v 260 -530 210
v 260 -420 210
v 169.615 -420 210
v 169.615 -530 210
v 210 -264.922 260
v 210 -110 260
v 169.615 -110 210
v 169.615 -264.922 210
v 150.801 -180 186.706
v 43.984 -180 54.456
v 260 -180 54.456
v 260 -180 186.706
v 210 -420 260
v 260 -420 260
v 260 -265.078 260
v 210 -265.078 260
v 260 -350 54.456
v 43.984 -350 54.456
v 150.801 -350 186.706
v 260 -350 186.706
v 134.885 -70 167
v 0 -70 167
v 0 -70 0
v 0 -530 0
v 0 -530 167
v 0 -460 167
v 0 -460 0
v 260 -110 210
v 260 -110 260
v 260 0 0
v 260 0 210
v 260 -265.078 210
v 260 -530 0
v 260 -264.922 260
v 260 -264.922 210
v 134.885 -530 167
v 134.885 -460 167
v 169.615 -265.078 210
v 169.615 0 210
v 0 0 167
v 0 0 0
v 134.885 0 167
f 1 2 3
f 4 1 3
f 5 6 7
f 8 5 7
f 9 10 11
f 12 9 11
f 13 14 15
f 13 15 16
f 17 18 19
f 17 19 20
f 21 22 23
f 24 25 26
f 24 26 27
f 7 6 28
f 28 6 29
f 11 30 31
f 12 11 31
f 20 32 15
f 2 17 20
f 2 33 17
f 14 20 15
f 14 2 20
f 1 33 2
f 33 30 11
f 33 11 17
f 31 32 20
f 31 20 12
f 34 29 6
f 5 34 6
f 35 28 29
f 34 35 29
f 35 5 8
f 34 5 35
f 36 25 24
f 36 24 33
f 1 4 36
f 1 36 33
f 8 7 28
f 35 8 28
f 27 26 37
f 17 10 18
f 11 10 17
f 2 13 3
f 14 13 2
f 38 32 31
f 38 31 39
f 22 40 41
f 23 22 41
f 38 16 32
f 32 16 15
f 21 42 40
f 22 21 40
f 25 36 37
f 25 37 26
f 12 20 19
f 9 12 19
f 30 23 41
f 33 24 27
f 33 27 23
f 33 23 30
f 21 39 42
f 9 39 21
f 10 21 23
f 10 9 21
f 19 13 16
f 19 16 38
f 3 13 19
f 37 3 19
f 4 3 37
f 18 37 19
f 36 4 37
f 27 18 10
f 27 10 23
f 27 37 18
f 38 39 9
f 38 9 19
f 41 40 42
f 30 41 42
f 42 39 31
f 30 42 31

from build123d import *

# Parameters (mm, degrees)
F1_DEPTH = 265
F2_DEPTH = 70
F3_DEPTH = 264.922
F4_DEPTH = 110
F6_DEPTH = 85


with BuildPart() as f1:
    # F0 (on Front) → F1 (new body)
    with BuildSketch(Plane.XZ):
        Polygon((134.8846153846, 167), (0, 0), (260, 0), (260, 210), (169.6153846154, 210), align=None)
    extrude(amount=F1_DEPTH)

    # F0 (on Front) → F2 (join)
    with BuildSketch(Plane.XZ):
        Polygon((0, 167), (0, 0), (134.8846153846, 167), align=None)
    extrude(amount=F2_DEPTH)

    # F5 (on face) → F6 (cut)
    with BuildSketch(Plane.XZ.offset(265)):
        Polygon((260, 186.7058832489), (150.800905701, 186.7058832489), (43.9835974961, 54.4558826143), (260, 54.4558826143), align=None)
    extrude(amount=-F6_DEPTH, mode=Mode.SUBTRACT)

    # F7: F1, F3 across face


with BuildPart() as f3:
    # F0 (on Front) → F3 (new body)
    with BuildSketch(Plane.XZ):
        Polygon((210, 260), (169.6153846154, 210), (260, 210), (260, 260), align=None)
    extrude(amount=F3_DEPTH)

    # F4 (cut): a face of the model
    f4_faces = [f3.faces().sort_by_distance(p)[0] for p in [
        (223.9357218124, 0, 232.602739726),
    ]]
    extrude(f4_faces, amount=-F4_DEPTH, mode=Mode.SUBTRACT)


with BuildPart() as f1_1:
    add(f1.part)
    add(f1.part.mirror(Plane(origin=(140.6572281226, -265, 26.3893267798), x_dir=(1, 0, 0), z_dir=(0, -1, 0))))
    add(f3.part.mirror(Plane(origin=(140.6572281226, -265, 26.3893267798), x_dir=(1, 0, 0), z_dir=(0, -1, 0))))


solid = Compound([f3.part, f1_1.part])
